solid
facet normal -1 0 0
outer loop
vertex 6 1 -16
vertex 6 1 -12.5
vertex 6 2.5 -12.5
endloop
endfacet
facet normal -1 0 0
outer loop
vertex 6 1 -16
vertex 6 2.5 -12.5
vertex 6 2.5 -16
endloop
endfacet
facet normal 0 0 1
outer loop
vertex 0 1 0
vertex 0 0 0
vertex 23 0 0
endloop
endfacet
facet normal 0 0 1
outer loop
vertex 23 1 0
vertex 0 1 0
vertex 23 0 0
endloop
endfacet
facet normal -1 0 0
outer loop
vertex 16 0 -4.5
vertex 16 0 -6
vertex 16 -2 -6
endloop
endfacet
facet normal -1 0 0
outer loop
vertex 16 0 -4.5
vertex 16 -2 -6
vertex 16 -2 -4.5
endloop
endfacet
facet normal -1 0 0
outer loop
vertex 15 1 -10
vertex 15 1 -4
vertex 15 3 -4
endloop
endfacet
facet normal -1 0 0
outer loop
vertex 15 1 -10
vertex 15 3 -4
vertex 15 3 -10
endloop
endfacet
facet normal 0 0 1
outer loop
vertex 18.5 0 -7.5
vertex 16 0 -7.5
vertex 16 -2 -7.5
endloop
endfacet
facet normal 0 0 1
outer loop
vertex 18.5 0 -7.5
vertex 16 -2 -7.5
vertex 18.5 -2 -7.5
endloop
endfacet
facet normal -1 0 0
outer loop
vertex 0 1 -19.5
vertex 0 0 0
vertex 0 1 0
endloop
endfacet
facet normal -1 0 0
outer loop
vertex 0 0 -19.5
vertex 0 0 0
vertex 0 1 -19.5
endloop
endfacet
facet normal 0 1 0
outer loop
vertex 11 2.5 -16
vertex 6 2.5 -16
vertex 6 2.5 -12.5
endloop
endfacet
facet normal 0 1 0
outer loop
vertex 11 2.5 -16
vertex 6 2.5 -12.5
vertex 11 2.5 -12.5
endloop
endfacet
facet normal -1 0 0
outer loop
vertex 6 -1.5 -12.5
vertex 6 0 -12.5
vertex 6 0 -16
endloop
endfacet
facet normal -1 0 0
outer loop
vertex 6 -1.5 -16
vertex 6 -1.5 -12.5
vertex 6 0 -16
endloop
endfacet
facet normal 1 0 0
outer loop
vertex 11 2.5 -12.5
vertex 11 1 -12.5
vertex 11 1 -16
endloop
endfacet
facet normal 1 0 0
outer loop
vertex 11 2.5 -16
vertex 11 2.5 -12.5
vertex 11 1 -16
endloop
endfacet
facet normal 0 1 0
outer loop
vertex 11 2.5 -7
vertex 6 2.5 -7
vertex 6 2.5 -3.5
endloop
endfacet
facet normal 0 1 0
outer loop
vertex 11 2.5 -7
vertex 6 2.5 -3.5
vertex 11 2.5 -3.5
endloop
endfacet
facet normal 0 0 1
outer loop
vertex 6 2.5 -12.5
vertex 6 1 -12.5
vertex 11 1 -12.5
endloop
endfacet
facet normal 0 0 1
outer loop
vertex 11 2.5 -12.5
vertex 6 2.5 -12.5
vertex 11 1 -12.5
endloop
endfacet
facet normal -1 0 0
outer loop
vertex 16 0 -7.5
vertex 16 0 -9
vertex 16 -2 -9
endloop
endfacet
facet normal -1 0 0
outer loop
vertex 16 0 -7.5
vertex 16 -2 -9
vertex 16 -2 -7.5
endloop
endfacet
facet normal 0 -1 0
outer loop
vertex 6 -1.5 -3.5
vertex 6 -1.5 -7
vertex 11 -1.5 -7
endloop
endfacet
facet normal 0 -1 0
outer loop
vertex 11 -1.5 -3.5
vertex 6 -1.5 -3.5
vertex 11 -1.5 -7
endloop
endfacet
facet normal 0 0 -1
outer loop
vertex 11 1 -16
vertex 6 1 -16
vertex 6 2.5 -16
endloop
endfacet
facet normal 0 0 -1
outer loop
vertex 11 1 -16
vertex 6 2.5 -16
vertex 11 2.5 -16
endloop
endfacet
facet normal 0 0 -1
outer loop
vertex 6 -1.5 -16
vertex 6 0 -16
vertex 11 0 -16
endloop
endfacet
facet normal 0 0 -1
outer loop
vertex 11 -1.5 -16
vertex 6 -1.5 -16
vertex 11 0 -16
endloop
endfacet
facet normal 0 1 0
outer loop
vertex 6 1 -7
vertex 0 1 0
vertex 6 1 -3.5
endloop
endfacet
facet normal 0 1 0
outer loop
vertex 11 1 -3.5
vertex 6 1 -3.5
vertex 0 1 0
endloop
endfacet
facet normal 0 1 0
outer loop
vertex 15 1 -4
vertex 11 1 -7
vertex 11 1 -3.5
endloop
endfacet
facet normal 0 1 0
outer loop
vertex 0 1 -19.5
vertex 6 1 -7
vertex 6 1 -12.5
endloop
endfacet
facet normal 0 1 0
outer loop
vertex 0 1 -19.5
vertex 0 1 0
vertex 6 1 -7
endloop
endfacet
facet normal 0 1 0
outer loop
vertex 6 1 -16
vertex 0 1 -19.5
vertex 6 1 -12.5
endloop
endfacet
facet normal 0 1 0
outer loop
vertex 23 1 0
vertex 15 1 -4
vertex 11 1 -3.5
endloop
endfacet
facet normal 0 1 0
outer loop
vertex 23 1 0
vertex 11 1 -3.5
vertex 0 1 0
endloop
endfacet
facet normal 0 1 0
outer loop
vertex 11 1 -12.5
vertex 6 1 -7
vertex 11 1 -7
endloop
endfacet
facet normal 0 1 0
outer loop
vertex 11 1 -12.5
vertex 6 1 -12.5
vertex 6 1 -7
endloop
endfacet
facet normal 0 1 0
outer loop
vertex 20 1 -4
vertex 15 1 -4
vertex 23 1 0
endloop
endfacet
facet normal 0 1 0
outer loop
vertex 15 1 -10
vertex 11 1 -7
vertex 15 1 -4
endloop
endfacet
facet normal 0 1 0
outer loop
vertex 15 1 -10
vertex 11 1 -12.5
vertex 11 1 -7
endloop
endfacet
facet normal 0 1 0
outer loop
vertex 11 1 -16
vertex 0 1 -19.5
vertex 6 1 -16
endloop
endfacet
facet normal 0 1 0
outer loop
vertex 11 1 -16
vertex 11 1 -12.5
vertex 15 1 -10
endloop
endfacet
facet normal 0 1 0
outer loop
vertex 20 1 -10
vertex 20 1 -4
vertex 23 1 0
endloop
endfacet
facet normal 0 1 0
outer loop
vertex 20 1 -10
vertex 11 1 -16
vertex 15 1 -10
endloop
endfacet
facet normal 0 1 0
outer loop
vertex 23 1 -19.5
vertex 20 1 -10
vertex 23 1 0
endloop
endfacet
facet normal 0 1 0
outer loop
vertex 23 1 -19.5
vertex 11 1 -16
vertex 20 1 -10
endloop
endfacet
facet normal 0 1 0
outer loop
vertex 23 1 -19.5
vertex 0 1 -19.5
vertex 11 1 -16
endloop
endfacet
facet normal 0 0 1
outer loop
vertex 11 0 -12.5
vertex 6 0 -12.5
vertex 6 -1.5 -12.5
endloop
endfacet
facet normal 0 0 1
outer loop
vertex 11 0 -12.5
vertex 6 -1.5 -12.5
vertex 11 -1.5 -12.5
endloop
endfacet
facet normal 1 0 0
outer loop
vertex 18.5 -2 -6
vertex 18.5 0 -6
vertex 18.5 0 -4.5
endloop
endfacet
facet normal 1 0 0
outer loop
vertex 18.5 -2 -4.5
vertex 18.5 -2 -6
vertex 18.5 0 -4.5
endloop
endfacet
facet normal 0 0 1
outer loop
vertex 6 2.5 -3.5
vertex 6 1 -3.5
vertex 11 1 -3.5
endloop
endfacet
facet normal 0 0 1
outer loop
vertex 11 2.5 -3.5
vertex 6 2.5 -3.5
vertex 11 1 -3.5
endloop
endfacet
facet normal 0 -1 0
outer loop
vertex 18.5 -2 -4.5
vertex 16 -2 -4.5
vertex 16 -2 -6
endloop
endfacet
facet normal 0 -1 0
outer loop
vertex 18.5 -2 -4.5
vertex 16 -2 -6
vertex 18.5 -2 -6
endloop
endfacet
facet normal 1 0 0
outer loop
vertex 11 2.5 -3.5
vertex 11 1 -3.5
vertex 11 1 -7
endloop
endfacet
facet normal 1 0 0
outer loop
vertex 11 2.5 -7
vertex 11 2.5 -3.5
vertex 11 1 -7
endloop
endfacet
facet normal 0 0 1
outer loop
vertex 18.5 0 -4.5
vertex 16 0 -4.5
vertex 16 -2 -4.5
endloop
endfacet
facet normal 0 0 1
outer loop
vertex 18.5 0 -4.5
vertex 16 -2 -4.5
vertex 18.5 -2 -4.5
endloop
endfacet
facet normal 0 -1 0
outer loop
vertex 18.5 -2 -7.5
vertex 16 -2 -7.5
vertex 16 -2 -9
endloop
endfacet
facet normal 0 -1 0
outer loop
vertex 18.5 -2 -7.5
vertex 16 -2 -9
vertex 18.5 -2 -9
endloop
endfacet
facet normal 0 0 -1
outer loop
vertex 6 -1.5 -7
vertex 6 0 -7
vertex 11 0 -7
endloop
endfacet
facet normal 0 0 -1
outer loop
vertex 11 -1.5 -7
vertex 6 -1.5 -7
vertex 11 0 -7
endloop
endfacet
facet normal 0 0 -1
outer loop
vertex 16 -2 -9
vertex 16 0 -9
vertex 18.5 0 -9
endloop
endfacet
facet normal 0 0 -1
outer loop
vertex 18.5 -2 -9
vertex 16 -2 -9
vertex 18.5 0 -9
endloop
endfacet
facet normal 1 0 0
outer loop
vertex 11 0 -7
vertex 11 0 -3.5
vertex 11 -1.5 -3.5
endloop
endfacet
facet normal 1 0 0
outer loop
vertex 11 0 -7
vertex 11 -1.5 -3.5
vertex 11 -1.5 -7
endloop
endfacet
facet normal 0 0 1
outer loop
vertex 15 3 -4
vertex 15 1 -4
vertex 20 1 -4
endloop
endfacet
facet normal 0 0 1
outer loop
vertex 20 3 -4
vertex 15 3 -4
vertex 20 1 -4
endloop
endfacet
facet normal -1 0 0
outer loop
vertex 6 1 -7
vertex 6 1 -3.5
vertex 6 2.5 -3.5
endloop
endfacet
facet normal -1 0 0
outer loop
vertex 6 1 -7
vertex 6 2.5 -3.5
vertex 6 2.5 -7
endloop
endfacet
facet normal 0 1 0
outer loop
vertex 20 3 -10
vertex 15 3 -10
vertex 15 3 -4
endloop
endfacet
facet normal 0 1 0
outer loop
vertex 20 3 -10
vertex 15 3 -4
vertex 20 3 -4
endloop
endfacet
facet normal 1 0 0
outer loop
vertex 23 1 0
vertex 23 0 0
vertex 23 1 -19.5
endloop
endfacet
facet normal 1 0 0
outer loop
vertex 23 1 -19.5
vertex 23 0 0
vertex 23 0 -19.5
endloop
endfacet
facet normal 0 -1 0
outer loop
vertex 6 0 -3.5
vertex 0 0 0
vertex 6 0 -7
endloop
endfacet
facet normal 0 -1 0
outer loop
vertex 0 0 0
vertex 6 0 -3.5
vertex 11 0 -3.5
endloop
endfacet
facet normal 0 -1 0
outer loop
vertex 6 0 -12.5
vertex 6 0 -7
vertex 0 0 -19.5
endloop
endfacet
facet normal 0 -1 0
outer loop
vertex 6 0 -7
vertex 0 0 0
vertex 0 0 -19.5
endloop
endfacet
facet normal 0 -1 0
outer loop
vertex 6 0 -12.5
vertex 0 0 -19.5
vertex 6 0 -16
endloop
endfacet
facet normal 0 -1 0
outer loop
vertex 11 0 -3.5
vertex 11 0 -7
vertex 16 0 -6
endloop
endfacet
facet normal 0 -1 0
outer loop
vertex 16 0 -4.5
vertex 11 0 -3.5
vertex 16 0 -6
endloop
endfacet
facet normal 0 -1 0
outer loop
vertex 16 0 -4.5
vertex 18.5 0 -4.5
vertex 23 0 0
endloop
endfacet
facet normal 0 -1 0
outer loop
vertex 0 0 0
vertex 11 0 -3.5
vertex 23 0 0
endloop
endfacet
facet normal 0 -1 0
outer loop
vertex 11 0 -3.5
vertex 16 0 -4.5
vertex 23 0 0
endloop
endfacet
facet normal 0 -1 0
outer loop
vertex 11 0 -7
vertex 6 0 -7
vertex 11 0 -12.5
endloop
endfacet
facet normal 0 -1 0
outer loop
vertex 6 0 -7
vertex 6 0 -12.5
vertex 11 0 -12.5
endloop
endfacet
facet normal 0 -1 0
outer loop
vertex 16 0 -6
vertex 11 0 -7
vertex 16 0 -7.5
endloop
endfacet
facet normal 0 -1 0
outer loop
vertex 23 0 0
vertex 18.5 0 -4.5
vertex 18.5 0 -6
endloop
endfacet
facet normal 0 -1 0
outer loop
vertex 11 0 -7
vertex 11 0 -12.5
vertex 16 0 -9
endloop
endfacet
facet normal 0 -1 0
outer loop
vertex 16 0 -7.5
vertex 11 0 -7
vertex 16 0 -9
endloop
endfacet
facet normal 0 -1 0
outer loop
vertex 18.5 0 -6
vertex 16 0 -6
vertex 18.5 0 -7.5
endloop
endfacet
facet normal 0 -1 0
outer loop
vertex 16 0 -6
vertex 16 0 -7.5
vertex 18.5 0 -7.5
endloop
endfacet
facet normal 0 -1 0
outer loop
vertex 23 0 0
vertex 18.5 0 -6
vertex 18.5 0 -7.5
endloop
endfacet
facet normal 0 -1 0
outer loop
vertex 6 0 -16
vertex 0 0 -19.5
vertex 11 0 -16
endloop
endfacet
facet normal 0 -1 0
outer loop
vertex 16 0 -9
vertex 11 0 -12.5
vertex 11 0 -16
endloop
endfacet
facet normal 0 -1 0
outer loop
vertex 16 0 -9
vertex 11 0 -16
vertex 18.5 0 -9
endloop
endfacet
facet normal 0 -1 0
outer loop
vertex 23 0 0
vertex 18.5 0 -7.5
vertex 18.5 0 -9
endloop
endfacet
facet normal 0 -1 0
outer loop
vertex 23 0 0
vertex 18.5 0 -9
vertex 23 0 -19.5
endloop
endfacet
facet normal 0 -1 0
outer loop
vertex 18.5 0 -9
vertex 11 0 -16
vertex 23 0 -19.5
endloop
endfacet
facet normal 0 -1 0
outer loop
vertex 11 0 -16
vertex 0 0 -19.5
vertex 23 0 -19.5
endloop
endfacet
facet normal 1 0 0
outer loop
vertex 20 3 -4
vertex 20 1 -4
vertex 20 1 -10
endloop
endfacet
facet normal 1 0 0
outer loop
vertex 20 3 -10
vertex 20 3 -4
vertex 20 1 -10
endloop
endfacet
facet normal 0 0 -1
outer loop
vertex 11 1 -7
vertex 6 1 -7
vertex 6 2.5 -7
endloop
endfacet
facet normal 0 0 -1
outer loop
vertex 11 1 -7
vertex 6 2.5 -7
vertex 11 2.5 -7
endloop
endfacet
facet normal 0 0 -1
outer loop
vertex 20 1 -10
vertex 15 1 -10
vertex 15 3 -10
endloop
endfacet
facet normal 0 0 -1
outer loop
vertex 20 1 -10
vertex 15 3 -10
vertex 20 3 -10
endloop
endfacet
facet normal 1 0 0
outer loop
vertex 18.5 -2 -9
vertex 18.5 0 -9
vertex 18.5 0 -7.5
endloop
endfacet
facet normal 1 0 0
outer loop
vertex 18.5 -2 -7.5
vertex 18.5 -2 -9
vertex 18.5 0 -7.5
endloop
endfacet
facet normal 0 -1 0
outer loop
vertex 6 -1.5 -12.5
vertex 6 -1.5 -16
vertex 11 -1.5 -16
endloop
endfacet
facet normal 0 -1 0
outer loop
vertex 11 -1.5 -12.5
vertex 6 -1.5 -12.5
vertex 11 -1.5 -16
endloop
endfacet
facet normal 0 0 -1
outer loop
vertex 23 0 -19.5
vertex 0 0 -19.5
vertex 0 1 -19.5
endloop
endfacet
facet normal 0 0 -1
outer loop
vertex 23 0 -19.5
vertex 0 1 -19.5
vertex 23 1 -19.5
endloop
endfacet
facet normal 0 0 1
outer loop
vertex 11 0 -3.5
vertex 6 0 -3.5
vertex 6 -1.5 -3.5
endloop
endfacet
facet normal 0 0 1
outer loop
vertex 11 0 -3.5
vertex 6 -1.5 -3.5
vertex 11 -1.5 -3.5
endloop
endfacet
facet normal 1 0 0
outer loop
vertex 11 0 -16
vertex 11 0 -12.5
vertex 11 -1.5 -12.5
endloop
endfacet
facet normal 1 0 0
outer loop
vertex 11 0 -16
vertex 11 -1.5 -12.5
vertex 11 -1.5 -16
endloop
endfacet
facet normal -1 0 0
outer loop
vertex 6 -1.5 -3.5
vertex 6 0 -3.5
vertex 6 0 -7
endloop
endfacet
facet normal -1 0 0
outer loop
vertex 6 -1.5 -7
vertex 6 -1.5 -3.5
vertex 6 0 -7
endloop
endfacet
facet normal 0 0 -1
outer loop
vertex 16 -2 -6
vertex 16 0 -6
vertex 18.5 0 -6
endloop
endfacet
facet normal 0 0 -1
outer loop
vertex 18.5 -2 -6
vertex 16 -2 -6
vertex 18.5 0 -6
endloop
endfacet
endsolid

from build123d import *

# Parameters (mm, degrees)
SKIZZE1_W                       = 23
SKIZZE1_H                       = 19.5
AUFSATZ_LINEAR_AUSTRAGEN1_DEPTH = 1
SKIZZE2_W                       = 5
SKIZZE2_H                       = 6
AUFSATZ_LINEAR_AUSTRAGEN2_DEPTH = 2
SKIZZE3_W                       = 5
SKIZZE3_H                       = 3.5
AUFSATZ_LINEAR_AUSTRAGEN3_DEPTH = 1.5
SKIZZE4_W                       = 2.5
SKIZZE4_H                       = 1.5
AUFSATZ_LINEAR_AUSTRAGEN4_DEPTH = 2


with BuildPart() as part:
    # Skizze1 → Aufsatz-Linear austragen1 (new body)
    with BuildSketch(Plane(origin=(0, 0, 0), x_dir=(1, 0, 0), z_dir=(0, 1, 0))):
        with Locations((11.5, 9.75)):
            Rectangle(SKIZZE1_W, SKIZZE1_H)
    extrude(amount=AUFSATZ_LINEAR_AUSTRAGEN1_DEPTH)

    # Skizze2 → Aufsatz-Linear austragen2 (add)
    with BuildSketch(Plane(origin=(0, 1, 0), x_dir=(1, 0, 0), z_dir=(0, 1, 0))):
        with Locations((17.5, 7)):
            Rectangle(SKIZZE2_W, SKIZZE2_H)
    extrude(amount=AUFSATZ_LINEAR_AUSTRAGEN2_DEPTH)

    # Skizze3 → Aufsatz-Linear austragen3 (add)
    with BuildSketch(Plane(origin=(0, 1, 0), x_dir=(1, 0, 0), z_dir=(0, 1, 0))):
        with Locations((8.5, 14.25)):
            Rectangle(SKIZZE3_W, SKIZZE3_H)
        with Locations((8.5, 5.25)):
            Rectangle(SKIZZE3_W, SKIZZE3_H)
    aufsatz_linear_austragen3 = extrude(amount=AUFSATZ_LINEAR_AUSTRAGEN3_DEPTH)

    # Spiegeln1: Aufsatz-Linear austragen3 across plane
    add(aufsatz_linear_austragen3.mirror(Plane.ZX.offset(0.5)))

    # Skizze4 → Aufsatz-Linear austragen4 (add)
    with BuildSketch(Plane.XZ):
        with Locations((17.25, -8.25)):
            Rectangle(SKIZZE4_W, SKIZZE4_H)
        with Locations((17.25, -5.25)):
            Rectangle(SKIZZE4_W, SKIZZE4_H)
    extrude(amount=AUFSATZ_LINEAR_AUSTRAGEN4_DEPTH)


solid = part.part
